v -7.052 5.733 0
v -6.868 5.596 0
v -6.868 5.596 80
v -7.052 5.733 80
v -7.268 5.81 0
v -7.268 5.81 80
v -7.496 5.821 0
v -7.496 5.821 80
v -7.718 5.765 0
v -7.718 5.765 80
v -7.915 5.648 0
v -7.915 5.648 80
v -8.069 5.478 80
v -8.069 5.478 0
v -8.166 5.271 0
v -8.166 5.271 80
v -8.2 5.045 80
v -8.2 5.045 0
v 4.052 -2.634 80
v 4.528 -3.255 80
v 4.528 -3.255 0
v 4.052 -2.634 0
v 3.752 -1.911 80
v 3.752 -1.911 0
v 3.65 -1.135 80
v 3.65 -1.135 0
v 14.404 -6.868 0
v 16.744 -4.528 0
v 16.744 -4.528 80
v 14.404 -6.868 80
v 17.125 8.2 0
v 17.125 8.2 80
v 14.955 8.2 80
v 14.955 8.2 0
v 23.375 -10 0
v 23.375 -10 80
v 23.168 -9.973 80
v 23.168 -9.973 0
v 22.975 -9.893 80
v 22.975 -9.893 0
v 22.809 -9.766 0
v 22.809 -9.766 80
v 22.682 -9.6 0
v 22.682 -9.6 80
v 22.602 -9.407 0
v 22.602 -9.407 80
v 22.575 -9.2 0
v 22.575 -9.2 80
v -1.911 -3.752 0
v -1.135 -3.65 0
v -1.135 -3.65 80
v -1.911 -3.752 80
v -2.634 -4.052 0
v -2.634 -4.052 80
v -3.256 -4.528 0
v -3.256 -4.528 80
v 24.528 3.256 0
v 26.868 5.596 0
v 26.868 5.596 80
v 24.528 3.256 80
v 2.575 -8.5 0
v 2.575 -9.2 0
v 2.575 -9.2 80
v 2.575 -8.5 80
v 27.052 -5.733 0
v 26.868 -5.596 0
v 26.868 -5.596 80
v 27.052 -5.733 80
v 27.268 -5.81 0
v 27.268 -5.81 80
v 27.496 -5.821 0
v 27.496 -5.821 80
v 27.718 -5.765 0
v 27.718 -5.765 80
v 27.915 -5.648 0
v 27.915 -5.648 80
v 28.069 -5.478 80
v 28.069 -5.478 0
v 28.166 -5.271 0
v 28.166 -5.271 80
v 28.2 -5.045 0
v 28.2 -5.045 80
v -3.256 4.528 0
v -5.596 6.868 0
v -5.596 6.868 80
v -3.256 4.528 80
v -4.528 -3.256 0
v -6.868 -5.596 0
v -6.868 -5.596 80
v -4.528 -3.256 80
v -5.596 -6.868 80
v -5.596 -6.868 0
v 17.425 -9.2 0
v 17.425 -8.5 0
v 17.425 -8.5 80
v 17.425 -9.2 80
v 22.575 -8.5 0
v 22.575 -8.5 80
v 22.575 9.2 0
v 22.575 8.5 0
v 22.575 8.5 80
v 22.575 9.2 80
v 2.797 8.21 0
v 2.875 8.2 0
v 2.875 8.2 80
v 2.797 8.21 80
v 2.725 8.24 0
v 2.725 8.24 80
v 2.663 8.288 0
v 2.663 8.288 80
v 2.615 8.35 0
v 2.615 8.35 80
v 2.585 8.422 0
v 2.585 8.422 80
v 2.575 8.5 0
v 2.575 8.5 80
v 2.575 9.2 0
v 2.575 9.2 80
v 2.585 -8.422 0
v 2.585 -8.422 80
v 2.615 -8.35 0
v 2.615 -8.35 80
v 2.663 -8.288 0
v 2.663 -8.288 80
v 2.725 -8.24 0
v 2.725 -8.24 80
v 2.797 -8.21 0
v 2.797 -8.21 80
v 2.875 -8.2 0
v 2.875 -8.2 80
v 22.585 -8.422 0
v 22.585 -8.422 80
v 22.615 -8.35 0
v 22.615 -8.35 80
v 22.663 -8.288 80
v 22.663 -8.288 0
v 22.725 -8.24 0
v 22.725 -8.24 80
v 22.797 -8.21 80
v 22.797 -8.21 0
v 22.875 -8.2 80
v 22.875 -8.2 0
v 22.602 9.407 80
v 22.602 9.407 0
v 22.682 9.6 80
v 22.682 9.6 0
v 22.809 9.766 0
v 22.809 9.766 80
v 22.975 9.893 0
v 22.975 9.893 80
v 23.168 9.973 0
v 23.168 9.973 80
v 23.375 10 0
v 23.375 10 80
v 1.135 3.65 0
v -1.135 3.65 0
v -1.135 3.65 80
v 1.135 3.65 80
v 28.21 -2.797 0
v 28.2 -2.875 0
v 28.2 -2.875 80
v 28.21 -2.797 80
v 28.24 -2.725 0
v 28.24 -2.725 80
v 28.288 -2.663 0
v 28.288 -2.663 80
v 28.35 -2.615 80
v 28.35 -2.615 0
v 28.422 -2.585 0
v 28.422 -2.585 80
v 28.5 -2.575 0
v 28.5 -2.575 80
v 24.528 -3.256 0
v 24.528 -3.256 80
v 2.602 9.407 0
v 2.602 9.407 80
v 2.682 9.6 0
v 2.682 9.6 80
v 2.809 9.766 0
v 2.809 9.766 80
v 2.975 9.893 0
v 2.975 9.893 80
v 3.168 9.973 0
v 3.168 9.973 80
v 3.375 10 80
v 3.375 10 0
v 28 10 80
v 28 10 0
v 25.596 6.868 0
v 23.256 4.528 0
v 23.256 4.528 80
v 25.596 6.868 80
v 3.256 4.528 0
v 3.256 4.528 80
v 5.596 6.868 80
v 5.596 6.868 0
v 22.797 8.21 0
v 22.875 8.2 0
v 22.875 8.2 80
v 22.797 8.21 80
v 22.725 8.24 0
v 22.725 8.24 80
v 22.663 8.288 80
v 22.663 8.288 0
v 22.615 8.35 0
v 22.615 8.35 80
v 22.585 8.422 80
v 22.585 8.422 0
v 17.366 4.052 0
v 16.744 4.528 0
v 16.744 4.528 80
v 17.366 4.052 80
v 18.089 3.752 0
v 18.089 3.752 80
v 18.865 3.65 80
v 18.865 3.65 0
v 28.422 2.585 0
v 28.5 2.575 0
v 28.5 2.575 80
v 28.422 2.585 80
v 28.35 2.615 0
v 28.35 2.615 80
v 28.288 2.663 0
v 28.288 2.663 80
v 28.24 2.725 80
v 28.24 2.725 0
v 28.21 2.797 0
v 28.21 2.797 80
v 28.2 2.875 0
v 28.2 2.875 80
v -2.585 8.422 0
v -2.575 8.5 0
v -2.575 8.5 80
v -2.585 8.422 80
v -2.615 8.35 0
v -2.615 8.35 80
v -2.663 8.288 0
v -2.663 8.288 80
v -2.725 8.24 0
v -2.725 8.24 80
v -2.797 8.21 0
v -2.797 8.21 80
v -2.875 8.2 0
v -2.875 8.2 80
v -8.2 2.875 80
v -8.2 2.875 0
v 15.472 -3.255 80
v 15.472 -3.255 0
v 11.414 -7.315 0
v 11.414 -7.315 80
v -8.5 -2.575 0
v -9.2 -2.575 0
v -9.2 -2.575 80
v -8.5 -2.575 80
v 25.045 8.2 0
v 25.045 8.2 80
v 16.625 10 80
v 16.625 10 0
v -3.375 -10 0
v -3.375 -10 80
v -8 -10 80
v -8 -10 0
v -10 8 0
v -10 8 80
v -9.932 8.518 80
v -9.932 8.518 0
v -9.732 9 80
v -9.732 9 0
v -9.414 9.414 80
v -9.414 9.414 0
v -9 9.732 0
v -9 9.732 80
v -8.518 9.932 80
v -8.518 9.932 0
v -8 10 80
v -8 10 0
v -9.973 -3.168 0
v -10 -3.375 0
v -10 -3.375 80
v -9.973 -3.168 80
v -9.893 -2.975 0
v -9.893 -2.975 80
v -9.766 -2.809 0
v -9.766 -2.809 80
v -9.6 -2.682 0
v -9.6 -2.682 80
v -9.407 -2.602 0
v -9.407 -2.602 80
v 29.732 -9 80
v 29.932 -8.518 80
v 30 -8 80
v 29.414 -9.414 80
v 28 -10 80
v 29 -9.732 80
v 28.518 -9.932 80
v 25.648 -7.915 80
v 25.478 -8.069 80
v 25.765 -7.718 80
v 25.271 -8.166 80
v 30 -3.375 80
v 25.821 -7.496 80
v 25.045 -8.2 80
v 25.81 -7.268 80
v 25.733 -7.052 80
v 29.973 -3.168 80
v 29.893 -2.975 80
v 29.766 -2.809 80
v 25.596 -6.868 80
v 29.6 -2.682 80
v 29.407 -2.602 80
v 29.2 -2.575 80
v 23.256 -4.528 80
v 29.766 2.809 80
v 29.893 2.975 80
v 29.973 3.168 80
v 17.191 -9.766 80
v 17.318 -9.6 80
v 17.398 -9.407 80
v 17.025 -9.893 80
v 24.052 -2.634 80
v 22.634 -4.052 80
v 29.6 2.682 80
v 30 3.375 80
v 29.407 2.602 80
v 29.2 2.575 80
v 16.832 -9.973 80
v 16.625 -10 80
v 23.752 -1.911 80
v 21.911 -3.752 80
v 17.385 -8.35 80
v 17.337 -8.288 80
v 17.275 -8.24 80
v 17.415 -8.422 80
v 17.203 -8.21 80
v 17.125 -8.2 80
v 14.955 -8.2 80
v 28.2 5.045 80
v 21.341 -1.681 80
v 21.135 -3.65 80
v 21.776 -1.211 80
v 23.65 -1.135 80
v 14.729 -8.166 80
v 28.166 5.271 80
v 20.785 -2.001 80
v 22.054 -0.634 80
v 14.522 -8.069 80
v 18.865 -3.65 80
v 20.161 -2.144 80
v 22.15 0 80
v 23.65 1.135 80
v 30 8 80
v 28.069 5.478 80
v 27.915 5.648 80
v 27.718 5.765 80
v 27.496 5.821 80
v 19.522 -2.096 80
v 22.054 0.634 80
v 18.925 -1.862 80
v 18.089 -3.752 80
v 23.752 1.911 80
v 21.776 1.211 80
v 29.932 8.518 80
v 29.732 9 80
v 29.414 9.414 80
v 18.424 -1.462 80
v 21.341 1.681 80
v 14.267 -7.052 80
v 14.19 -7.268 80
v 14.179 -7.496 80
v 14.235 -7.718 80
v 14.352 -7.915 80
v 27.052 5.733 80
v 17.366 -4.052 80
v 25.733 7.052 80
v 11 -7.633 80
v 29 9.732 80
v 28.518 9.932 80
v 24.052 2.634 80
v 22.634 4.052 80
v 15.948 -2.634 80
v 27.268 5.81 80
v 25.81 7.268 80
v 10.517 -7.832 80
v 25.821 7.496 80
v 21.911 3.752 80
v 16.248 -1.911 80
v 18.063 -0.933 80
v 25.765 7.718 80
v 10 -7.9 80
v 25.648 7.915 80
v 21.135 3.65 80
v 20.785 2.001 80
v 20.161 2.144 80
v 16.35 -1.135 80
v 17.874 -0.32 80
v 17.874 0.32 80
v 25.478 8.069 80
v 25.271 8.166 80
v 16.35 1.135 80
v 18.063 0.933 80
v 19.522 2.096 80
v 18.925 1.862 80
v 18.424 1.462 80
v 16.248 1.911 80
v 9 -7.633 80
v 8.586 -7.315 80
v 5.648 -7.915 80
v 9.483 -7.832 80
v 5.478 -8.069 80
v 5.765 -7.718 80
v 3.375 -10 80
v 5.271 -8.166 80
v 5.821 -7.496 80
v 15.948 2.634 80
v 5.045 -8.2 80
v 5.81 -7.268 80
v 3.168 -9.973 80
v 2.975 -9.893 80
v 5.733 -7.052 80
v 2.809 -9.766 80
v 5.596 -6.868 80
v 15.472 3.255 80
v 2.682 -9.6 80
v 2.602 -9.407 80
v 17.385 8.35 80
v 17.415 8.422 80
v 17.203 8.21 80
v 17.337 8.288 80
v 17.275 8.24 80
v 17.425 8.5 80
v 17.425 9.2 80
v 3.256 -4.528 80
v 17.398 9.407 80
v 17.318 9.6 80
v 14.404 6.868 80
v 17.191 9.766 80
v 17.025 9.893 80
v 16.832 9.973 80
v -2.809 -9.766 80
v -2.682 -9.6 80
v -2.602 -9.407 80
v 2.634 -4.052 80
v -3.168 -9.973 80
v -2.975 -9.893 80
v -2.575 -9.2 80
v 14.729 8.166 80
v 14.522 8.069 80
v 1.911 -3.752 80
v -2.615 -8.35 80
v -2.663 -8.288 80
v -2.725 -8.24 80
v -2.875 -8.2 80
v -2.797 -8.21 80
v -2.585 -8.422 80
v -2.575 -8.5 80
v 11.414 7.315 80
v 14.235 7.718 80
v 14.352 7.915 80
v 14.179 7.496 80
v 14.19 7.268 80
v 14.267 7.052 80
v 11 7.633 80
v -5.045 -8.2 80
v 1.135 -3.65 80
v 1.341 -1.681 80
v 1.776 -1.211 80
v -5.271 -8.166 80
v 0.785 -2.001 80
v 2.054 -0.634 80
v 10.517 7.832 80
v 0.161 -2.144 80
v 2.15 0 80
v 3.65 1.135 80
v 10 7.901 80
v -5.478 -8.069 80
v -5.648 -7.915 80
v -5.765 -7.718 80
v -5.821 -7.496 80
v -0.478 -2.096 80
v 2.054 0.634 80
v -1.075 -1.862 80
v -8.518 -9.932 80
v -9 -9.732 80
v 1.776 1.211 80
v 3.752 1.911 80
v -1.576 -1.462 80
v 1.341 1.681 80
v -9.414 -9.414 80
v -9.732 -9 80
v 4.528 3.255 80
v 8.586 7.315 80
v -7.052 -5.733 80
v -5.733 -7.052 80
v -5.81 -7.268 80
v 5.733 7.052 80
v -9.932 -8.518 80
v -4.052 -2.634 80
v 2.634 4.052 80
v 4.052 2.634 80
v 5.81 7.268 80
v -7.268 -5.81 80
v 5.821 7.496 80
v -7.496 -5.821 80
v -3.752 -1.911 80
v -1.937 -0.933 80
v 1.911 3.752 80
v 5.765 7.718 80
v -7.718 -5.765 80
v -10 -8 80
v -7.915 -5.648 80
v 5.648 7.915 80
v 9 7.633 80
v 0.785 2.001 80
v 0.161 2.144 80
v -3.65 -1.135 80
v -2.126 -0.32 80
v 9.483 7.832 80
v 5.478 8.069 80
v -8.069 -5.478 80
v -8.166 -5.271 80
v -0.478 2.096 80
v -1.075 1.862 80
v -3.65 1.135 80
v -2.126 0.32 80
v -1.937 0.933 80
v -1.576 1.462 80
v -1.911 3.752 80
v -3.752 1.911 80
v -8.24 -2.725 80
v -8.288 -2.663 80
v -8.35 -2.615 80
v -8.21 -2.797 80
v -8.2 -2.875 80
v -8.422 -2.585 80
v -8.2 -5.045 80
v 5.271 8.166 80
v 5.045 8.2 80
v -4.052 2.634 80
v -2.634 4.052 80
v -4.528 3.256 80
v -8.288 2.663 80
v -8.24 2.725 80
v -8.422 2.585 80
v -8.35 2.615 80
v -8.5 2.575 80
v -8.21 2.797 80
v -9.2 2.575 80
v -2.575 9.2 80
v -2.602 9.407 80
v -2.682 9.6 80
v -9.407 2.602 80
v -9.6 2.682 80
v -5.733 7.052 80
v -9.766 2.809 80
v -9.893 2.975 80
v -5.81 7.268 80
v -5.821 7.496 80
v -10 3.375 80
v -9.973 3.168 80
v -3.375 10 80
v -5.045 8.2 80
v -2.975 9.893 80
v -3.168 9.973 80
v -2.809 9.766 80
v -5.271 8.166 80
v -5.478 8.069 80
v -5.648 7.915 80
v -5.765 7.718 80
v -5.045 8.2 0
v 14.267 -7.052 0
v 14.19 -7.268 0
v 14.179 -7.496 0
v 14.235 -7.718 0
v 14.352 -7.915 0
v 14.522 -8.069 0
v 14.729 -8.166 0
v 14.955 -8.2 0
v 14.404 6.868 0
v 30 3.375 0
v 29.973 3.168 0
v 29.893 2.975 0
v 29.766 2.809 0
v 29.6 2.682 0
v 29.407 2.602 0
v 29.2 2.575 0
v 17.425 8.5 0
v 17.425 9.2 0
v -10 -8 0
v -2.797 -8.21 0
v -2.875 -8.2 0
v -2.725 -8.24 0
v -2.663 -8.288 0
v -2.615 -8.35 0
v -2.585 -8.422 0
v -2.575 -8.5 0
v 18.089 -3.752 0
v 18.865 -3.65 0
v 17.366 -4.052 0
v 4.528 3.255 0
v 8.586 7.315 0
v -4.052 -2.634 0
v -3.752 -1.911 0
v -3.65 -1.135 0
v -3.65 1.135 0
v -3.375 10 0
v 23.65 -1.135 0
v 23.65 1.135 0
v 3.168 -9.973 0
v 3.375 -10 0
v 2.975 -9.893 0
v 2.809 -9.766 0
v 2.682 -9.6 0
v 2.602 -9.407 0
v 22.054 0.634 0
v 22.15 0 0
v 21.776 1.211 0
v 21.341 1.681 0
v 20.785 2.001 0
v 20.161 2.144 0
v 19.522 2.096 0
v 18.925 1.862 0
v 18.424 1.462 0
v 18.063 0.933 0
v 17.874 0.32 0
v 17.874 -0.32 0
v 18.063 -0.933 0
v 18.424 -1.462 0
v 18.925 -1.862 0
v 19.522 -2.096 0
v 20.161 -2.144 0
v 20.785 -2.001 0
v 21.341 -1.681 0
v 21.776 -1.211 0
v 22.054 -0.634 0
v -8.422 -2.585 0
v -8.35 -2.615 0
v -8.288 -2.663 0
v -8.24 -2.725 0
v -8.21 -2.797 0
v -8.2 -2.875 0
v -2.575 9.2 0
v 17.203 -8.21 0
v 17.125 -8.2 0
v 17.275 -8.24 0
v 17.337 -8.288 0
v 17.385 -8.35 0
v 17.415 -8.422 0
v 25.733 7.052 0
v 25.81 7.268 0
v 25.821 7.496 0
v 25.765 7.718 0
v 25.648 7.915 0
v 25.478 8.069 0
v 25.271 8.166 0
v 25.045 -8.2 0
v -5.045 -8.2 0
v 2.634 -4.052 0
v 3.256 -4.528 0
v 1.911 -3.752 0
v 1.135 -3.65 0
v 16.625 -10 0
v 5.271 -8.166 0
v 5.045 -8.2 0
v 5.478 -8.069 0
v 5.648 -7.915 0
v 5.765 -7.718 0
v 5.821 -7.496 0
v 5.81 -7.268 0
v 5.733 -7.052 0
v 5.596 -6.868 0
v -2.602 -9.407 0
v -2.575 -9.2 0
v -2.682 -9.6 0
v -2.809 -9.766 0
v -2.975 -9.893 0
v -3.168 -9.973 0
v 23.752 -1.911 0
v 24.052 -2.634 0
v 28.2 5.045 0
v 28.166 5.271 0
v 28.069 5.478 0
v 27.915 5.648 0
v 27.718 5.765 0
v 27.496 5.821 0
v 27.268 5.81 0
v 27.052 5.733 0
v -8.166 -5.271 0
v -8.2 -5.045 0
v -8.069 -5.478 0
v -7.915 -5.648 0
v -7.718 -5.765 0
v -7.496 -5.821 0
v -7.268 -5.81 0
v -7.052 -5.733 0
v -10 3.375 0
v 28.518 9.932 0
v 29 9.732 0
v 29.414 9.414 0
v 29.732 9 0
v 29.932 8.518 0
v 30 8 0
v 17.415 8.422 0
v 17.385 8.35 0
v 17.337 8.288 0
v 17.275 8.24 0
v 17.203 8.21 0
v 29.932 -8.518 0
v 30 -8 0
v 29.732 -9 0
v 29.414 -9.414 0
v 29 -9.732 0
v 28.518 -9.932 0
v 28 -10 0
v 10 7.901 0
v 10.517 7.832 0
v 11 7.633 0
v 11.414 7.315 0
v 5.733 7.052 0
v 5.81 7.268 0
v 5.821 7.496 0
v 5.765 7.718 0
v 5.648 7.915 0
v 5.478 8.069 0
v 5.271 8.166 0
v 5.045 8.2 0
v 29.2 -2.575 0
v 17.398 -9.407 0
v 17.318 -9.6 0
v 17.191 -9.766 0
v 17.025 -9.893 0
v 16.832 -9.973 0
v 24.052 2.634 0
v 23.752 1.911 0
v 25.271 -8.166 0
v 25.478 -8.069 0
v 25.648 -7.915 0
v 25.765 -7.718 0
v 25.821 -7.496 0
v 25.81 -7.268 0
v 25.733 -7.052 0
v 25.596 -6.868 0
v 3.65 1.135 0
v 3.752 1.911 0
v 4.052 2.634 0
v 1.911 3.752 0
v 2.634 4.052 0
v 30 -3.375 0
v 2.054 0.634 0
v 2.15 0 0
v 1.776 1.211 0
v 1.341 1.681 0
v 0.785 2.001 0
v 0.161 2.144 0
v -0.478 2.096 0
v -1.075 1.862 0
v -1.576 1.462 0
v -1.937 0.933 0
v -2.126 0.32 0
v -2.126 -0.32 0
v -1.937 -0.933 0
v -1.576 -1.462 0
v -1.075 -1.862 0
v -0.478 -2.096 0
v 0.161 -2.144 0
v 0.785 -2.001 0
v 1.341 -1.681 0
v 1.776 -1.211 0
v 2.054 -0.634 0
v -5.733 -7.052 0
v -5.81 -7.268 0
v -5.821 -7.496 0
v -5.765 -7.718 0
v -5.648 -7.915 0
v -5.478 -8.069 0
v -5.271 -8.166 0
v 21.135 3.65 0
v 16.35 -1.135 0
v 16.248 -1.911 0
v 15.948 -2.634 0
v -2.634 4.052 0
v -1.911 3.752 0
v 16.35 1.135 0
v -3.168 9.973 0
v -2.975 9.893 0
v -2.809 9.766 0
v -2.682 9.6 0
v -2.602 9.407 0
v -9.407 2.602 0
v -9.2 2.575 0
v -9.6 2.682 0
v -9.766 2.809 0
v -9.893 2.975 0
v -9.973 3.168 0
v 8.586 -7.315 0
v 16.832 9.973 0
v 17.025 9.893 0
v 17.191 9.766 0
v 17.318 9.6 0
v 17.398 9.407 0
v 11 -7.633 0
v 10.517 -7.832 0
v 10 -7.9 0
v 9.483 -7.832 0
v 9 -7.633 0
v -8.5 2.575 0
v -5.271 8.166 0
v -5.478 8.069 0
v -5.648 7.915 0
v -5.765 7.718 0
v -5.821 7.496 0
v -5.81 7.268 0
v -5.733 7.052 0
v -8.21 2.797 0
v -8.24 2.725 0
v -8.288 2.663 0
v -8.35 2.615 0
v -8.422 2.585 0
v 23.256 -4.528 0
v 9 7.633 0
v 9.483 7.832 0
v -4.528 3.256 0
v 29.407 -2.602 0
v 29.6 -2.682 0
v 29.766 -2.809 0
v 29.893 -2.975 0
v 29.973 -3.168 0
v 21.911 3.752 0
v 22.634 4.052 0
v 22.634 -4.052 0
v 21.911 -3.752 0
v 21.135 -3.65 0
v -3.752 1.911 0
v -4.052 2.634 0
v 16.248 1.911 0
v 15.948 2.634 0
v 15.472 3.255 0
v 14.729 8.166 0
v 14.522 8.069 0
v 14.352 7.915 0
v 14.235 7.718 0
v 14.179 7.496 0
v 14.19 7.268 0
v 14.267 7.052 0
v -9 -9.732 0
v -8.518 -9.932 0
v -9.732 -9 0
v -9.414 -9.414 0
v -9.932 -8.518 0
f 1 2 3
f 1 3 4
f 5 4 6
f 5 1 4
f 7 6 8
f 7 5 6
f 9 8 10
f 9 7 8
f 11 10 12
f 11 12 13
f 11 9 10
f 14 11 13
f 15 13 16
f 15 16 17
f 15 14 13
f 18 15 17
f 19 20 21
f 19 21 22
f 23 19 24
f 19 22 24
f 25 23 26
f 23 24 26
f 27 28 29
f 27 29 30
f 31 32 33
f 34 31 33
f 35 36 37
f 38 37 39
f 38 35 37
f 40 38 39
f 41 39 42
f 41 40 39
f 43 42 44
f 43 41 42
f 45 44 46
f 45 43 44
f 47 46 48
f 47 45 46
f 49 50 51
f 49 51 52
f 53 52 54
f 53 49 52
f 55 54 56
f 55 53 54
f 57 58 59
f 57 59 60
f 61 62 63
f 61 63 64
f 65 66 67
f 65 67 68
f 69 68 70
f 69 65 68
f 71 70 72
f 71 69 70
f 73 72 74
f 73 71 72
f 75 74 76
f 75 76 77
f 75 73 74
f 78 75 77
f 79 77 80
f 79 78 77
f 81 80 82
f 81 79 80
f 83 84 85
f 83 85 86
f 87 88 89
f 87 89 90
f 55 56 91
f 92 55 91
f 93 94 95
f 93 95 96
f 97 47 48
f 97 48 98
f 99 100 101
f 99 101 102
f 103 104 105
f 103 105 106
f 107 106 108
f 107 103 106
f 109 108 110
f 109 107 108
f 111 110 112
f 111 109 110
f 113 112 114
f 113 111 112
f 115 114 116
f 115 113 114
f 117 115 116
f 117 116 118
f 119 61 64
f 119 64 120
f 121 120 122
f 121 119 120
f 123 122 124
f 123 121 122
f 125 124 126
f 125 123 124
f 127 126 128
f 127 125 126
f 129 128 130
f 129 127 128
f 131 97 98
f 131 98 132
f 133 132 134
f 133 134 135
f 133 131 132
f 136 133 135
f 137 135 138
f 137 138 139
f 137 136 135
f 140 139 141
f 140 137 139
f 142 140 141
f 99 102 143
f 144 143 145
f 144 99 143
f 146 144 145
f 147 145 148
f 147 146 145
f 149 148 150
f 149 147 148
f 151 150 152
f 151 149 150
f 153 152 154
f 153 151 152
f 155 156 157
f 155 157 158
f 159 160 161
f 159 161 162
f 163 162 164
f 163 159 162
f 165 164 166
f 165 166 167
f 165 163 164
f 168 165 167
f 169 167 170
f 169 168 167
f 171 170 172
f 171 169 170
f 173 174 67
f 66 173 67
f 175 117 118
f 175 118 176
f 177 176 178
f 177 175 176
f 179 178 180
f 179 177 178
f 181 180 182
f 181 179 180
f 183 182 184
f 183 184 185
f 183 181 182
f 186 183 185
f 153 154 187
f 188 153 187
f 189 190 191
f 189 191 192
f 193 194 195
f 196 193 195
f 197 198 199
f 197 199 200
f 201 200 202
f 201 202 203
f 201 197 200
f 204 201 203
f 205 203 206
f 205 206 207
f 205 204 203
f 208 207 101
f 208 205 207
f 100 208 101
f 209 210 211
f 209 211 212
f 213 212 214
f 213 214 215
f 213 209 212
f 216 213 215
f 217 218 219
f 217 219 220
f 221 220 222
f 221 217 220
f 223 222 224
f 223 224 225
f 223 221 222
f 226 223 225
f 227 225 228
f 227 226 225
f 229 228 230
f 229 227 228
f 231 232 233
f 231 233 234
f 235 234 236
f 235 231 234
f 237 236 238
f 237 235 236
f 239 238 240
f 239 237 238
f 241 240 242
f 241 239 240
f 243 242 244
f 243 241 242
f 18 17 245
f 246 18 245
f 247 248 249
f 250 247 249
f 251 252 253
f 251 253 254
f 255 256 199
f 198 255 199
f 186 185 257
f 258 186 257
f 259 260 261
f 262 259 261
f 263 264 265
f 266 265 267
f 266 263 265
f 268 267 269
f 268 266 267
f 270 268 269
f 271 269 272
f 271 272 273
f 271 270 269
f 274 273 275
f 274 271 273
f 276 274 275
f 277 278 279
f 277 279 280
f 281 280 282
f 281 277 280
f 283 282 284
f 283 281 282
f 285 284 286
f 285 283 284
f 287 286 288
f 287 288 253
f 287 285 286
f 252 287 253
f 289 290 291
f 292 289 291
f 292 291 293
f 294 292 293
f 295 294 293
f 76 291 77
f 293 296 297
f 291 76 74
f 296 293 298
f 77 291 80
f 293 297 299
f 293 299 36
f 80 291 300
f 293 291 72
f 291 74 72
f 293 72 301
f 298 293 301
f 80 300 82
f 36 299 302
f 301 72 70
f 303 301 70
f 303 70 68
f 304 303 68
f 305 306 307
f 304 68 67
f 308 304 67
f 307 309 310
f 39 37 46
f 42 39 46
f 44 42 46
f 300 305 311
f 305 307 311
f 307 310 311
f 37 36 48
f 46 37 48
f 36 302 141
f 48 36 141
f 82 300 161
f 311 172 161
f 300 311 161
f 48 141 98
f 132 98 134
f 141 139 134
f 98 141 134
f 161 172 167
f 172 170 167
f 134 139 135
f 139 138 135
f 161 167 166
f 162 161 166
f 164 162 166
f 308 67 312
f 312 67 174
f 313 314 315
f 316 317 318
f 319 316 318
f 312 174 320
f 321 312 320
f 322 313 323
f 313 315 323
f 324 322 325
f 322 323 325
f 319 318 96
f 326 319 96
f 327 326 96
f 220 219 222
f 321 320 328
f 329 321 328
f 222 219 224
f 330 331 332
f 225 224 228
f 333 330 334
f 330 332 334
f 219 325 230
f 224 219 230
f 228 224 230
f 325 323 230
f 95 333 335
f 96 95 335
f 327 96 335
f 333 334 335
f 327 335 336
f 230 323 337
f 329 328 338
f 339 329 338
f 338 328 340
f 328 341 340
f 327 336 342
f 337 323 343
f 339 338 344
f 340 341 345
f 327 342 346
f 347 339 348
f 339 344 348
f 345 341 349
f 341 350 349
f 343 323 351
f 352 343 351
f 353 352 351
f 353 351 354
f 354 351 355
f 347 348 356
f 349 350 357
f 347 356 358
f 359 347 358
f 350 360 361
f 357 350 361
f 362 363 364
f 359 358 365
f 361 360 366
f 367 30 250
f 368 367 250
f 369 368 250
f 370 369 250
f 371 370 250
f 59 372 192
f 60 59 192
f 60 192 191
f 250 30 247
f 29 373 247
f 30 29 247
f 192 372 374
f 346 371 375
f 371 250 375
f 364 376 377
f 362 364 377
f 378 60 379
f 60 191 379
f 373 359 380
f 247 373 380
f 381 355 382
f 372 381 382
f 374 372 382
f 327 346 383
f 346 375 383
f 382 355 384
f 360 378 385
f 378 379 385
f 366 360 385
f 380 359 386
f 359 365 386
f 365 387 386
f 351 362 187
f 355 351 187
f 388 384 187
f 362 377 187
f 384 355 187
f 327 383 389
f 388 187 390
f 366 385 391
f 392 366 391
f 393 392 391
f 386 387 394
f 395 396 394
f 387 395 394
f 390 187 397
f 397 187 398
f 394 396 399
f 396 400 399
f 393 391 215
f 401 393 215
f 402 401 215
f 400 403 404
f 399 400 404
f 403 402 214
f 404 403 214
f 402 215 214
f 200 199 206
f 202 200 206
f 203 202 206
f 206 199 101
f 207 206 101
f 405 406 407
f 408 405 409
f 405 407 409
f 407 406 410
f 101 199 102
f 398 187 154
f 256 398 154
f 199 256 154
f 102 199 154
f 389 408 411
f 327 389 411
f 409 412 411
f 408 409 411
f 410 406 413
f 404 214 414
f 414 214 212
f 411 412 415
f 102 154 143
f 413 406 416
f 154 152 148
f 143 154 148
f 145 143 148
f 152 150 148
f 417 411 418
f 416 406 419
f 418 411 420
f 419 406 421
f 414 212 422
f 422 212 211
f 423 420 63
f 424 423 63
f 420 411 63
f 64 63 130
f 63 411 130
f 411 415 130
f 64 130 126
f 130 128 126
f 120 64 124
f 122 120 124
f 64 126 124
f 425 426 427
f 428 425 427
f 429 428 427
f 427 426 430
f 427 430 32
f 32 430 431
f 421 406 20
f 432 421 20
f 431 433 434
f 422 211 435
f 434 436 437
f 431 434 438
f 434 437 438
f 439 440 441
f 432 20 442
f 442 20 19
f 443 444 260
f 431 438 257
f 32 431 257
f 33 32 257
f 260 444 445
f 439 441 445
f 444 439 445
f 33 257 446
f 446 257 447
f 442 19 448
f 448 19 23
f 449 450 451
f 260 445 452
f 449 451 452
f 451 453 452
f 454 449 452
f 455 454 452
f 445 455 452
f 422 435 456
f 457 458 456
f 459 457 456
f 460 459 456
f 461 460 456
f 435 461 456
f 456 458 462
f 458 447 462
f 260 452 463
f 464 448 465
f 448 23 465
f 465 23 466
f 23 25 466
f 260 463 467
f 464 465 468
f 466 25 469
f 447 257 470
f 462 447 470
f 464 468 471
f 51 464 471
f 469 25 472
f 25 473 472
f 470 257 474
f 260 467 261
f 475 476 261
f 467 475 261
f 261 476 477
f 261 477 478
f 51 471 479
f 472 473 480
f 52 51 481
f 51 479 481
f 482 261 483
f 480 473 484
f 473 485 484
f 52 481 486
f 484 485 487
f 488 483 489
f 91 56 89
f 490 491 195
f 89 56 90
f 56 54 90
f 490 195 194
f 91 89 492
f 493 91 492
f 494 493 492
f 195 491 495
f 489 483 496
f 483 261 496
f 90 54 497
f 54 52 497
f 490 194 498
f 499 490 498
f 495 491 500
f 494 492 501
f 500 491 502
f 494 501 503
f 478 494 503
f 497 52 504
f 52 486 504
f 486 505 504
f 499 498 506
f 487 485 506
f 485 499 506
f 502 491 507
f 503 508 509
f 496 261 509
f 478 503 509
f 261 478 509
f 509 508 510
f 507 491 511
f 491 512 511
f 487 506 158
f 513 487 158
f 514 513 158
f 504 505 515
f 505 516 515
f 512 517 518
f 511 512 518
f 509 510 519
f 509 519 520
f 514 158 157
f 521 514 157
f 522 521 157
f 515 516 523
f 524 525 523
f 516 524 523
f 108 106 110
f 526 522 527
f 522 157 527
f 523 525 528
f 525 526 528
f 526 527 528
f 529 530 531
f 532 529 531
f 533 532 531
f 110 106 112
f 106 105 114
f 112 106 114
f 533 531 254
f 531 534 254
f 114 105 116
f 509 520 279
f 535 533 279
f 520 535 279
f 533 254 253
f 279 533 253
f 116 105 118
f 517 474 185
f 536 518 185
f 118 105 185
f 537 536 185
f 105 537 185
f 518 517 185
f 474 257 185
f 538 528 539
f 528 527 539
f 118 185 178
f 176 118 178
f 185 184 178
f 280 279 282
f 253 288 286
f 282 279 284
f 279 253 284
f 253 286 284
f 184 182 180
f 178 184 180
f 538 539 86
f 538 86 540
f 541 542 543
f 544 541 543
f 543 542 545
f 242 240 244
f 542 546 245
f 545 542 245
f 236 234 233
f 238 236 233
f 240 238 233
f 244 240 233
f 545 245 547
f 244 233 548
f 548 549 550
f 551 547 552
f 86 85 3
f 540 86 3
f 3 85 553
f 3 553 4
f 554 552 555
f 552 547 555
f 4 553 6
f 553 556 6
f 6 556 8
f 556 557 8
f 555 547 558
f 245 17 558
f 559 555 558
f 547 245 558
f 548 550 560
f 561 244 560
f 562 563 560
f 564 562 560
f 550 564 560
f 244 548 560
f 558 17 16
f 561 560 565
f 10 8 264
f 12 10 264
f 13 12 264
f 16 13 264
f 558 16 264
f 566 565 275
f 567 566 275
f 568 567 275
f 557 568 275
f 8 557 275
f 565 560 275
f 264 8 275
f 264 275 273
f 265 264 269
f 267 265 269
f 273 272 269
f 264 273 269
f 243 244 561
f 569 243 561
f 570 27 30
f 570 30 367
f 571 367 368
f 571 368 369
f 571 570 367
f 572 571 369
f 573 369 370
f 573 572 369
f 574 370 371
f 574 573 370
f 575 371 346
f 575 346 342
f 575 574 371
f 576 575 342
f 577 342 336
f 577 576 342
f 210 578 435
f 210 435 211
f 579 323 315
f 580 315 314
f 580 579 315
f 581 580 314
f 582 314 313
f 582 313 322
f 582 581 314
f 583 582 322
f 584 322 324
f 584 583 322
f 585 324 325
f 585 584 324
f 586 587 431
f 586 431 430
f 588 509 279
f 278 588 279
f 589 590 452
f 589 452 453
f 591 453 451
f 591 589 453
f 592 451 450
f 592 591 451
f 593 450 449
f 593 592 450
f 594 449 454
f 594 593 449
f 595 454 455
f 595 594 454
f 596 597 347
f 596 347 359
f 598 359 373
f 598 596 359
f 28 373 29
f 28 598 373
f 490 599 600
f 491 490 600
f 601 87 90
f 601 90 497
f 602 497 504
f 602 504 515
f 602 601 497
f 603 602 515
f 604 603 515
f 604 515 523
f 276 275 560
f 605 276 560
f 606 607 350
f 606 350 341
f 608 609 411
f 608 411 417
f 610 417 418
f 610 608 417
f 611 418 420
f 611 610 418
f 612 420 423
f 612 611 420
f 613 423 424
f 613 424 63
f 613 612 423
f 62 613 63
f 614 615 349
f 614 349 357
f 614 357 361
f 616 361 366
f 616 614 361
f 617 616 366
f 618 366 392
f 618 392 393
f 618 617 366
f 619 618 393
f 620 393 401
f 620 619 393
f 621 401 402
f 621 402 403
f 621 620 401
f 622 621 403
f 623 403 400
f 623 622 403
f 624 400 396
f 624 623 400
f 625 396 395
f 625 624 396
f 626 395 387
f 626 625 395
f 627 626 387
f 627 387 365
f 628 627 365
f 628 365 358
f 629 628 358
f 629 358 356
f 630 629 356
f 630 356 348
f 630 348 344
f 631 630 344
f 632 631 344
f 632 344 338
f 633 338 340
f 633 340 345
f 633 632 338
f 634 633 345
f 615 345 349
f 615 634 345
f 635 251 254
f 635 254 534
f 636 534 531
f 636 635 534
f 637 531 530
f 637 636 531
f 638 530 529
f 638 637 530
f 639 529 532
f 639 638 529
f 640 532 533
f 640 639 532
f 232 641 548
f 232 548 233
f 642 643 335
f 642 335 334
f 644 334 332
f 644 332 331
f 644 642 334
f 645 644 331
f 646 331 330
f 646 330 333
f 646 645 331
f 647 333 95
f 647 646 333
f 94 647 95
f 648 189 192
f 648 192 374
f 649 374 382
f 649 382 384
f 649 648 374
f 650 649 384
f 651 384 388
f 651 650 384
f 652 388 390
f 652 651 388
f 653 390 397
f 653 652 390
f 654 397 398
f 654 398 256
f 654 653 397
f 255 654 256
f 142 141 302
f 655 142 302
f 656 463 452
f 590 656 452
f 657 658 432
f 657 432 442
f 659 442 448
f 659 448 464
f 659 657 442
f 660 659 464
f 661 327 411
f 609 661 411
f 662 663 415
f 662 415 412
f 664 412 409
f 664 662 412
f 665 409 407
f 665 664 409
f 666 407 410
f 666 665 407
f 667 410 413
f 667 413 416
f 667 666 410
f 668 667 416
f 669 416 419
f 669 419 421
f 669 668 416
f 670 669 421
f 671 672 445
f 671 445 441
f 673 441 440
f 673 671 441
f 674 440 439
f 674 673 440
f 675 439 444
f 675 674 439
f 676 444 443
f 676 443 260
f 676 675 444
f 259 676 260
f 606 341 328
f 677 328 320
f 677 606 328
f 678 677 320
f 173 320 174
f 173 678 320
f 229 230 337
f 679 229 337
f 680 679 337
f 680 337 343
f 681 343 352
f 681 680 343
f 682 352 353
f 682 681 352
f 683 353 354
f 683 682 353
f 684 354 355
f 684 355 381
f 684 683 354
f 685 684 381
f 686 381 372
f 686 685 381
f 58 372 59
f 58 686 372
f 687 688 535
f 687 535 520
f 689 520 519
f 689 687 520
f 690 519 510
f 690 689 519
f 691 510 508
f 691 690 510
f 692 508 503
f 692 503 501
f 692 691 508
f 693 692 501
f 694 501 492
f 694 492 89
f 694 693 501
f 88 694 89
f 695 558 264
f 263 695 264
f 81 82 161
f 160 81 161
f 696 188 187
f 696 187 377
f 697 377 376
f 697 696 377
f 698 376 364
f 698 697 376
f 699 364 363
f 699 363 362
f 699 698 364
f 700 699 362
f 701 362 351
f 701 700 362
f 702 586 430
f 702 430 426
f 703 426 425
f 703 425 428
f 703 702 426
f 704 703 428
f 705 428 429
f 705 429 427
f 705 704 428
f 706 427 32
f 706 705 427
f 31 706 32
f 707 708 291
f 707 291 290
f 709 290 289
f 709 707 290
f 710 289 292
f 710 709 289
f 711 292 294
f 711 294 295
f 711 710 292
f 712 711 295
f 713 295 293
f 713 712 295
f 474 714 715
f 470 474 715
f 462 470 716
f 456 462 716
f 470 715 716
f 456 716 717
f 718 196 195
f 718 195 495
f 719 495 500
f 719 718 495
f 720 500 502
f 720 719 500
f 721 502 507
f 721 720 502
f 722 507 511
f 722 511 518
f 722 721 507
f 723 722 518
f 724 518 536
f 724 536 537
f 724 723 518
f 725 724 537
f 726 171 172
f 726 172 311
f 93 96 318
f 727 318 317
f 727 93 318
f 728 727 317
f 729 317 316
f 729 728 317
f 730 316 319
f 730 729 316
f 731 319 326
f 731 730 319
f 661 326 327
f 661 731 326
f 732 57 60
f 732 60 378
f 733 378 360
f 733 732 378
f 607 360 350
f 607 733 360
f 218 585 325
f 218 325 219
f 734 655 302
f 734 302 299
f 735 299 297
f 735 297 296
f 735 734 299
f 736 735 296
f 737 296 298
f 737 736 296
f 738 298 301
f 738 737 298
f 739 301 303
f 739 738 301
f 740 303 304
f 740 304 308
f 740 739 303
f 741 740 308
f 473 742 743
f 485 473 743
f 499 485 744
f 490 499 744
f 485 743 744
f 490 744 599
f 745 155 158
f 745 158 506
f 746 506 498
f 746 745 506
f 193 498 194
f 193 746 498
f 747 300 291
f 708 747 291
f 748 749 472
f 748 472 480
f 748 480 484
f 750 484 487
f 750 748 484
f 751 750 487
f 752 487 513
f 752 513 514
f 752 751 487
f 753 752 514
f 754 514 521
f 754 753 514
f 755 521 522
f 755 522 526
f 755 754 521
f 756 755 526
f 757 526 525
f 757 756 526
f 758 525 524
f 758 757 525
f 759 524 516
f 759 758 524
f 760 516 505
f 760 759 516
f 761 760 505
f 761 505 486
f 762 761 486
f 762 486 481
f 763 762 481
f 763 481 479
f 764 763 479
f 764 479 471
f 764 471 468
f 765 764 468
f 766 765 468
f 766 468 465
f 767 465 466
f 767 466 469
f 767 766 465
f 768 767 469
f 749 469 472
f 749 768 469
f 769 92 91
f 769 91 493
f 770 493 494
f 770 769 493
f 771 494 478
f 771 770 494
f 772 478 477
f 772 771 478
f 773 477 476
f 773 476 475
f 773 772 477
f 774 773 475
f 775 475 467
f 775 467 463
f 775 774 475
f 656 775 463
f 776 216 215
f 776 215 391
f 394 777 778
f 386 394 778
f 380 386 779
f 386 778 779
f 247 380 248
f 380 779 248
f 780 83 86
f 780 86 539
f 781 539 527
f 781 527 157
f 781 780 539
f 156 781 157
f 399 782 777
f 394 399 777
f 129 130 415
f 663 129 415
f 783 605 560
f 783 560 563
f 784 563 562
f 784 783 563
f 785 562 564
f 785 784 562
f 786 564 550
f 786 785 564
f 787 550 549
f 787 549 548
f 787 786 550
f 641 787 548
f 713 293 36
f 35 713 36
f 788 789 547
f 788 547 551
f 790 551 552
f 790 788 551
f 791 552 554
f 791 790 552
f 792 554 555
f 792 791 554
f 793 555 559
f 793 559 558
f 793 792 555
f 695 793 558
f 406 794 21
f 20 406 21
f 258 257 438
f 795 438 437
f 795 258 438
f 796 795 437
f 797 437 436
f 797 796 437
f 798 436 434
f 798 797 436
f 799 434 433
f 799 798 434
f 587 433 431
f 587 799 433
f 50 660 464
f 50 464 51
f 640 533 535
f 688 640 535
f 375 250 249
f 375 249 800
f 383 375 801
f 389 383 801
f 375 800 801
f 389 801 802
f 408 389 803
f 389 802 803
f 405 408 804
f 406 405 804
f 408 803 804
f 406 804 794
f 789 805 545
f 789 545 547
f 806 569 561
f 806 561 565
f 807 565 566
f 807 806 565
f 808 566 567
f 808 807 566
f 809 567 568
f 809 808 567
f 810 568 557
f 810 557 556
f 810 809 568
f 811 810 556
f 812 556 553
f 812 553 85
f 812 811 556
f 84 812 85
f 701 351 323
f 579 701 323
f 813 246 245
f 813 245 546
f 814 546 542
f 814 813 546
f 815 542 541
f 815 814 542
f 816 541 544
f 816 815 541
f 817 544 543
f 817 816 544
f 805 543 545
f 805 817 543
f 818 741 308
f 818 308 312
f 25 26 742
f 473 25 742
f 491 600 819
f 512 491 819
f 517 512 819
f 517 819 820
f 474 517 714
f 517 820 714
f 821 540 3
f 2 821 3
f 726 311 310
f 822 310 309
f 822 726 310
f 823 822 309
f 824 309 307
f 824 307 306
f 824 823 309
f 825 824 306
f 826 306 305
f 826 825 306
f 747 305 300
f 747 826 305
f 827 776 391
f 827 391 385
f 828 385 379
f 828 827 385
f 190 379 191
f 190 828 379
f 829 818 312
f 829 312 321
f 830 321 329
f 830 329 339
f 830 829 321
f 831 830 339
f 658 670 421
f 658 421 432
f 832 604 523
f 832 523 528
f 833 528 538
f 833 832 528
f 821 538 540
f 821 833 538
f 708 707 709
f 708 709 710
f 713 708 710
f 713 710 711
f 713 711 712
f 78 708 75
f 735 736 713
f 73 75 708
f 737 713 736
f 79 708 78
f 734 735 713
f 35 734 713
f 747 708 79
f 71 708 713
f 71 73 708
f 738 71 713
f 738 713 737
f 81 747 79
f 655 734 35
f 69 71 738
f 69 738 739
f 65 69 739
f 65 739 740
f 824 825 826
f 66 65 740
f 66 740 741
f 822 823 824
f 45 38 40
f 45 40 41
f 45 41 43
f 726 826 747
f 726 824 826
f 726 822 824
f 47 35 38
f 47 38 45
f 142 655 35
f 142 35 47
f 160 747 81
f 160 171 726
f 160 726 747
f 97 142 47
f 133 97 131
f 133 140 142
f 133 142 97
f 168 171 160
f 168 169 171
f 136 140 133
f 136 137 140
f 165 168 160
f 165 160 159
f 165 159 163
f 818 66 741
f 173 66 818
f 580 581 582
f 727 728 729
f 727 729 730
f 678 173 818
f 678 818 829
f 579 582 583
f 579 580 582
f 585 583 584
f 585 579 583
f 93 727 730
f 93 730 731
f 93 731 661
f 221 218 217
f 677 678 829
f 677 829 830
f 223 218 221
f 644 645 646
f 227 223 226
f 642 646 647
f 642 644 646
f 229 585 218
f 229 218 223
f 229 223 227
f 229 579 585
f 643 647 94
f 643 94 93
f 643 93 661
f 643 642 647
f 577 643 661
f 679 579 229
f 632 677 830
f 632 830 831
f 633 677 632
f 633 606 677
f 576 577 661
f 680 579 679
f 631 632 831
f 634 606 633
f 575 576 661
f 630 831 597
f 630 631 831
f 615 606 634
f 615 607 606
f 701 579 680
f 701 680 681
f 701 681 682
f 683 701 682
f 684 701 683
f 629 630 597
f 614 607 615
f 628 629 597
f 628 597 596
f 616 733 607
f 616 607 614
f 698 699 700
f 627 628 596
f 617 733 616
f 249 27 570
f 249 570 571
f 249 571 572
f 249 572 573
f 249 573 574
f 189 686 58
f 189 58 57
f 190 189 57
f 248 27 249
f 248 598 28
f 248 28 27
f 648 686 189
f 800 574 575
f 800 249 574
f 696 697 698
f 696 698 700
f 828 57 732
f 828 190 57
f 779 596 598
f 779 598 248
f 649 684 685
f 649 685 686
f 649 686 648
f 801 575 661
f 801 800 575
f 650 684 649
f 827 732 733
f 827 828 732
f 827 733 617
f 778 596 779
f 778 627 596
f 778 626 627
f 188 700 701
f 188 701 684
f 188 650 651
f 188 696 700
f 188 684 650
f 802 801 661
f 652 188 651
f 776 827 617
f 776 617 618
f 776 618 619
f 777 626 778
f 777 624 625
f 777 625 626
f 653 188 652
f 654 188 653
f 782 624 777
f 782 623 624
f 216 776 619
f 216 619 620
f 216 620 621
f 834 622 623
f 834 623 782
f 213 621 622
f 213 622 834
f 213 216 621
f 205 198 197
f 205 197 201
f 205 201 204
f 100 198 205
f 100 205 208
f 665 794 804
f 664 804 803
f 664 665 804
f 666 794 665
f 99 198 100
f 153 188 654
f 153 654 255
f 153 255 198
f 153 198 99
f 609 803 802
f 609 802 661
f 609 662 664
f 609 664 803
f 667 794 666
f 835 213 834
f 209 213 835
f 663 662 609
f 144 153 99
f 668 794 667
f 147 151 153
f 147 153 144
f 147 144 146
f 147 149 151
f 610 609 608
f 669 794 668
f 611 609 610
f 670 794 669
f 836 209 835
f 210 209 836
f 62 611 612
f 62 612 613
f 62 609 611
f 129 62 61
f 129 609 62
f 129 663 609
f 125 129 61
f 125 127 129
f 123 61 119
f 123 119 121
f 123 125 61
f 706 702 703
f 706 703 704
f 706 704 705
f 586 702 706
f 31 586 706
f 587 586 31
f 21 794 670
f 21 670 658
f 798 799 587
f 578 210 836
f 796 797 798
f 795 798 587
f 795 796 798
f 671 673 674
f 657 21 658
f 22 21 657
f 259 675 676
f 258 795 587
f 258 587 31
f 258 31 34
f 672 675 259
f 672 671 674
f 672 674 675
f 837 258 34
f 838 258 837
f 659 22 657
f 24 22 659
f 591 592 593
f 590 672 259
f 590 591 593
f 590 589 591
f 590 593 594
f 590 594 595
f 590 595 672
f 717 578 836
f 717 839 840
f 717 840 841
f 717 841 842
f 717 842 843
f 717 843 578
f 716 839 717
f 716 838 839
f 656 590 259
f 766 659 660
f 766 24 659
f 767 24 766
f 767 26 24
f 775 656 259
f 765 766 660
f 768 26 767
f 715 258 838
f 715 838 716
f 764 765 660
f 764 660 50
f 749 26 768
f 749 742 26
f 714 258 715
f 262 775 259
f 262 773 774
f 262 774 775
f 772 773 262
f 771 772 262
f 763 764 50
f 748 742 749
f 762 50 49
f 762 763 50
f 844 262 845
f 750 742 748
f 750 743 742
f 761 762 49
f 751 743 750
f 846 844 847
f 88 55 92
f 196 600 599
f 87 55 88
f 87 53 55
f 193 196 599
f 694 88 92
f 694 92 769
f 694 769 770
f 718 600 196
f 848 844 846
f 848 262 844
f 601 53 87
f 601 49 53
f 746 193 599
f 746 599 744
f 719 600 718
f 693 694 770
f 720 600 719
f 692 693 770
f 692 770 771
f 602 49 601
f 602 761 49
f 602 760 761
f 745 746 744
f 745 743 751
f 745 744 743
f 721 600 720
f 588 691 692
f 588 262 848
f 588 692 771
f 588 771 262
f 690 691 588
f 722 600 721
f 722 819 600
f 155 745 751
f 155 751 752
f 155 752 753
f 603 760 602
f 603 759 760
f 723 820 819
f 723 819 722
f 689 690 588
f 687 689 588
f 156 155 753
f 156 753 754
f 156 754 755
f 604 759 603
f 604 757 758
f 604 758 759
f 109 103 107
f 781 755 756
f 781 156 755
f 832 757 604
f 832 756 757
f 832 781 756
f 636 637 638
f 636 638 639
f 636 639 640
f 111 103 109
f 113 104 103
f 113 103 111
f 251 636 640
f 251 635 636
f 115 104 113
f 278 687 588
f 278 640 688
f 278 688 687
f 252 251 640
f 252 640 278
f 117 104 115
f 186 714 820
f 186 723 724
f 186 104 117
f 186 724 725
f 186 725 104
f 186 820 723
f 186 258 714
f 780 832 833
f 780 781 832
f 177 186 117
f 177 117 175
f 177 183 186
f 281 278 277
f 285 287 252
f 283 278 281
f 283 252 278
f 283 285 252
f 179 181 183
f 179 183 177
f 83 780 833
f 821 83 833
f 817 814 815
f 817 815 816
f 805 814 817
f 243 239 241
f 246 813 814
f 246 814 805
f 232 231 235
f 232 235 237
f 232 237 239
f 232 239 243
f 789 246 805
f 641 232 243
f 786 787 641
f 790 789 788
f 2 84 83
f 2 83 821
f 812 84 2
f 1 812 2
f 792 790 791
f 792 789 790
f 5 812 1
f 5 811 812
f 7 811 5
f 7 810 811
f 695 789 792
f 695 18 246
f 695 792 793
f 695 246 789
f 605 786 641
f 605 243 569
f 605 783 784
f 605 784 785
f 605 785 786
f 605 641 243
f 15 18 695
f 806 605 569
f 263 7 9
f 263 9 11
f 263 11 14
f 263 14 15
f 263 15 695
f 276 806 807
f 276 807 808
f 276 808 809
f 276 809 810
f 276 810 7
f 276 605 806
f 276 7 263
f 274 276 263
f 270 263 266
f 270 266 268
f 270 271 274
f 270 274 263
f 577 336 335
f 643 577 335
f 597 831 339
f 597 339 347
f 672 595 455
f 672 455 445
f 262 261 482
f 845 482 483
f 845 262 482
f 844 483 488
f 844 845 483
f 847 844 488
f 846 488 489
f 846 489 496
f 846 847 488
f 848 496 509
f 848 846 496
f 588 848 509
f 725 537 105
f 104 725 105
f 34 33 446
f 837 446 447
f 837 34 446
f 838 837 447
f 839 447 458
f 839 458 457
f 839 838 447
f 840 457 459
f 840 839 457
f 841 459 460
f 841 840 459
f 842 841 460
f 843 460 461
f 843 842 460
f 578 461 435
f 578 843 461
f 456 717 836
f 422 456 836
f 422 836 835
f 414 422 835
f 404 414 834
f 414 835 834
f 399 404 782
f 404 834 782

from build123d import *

# Parameters (mm, degrees)
CROQUIS3_R              = 2.15
SALIENTE_EXTRUIR1_DEPTH = 80


with BuildPart() as part:
    # Croquis3 → Saliente-Extruir1 (new body)
    with BuildSketch(Plane.XY):
        with BuildLine():
            Line((-2.574814133, 9.2), (-2.574814133, 8.5))
            ThreePointArc((-2.574814133, 8.5), (-2.662682099, 8.287867966), (-2.874814133, 8.2))
            Line((-2.874814133, 8.2), (-5.044814133, 8.2))
            ThreePointArc((-5.044814133, 8.2), (-5.765448465, 7.718473047), (-5.596326761, 6.868426051))
            Line((-5.596326761, 6.868426051), (-3.255673209, 4.528032719))
            ThreePointArc((-3.255673209, 4.528032719), (-2.282627587, 3.878186348), (-1.135, 3.65))
            Line((-1.135, 3.65), (1.135, 3.65))
            ThreePointArc((1.135, 3.65), (2.282627587, 3.878186348), (3.255673209, 4.528032719))
            Line((3.255673209, 4.528032719), (5.596326761, 6.868426051))
            ThreePointArc((5.596326761, 6.868426051), (5.765448465, 7.718473047), (5.044814133, 8.2))
            Line((5.044814133, 8.2), (2.874814133, 8.2))
            ThreePointArc((2.874814133, 8.2), (2.662682099, 8.287867966), (2.574814133, 8.5))
            Line((2.574814133, 8.5), (2.574814133, 9.2))
            ThreePointArc((2.574814133, 9.2), (2.809128708, 9.765685425), (3.374814133, 10))
            Line((3.374814133, 10), (16.625185867, 10))
            ThreePointArc((16.625185867, 10), (17.190871292, 9.765685425), (17.425185867, 9.2))
            Line((17.425185867, 9.2), (17.425185867, 8.5))
            ThreePointArc((17.425185867, 8.5), (17.337317901, 8.287867966), (17.125185867, 8.2))
            Line((17.125185867, 8.2), (14.955185867, 8.2))
            ThreePointArc((14.955185867, 8.2), (14.234551535, 7.718473047), (14.403673239, 6.868426051))
            Line((14.403673239, 6.868426051), (16.744326791, 4.528032719))
            ThreePointArc((16.744326791, 4.528032719), (17.717372413, 3.878186348), (18.865, 3.65))
            Line((18.865, 3.65), (21.135, 3.65))
            ThreePointArc((21.135, 3.65), (22.282627587, 3.878186348), (23.255673209, 4.528032719))
            Line((23.255673209, 4.528032719), (25.596326761, 6.868426051))
            ThreePointArc((25.596326761, 6.868426051), (25.765448465, 7.718473047), (25.044814133, 8.2))
            Line((25.044814133, 8.2), (22.874814133, 8.2))
            ThreePointArc((22.874814133, 8.2), (22.662682099, 8.287867966), (22.574814133, 8.5))
            Line((22.574814133, 8.5), (22.574814133, 9.2))
            ThreePointArc((22.574814133, 9.2), (22.809128708, 9.765685425), (23.374814133, 10))
            Line((23.374814133, 10), (28, 10))
            ThreePointArc((28, 10), (29.414213562, 9.414213562), (30, 8))
            Line((30, 8), (30, 3.374814133))
            ThreePointArc((30, 3.374814133), (29.765685425, 2.809128708), (29.2, 2.574814133))
            Line((29.2, 2.574814133), (28.5, 2.574814133))
            ThreePointArc((28.5, 2.574814133), (28.287867966, 2.662682099), (28.2, 2.874814133))
            Line((28.2, 2.874814133), (28.2, 5.044814133))
            ThreePointArc((28.2, 5.044814133), (27.718473047, 5.765448465), (26.868426051, 5.596326761))
            Line((26.868426051, 5.596326761), (24.528032719, 3.255673209))
            ThreePointArc((24.528032719, 3.255673209), (23.878186348, 2.282627587), (23.65, 1.135))
            Line((23.65, 1.135), (23.65, -1.135))
            ThreePointArc((23.65, -1.135), (23.878186348, -2.282627587), (24.528032719, -3.255673209))
            Line((24.528032719, -3.255673209), (26.868426051, -5.596326761))
            ThreePointArc((26.868426051, -5.596326761), (27.718473047, -5.765448465), (28.2, -5.044814133))
            Line((28.2, -5.044814133), (28.2, -2.874814133))
            ThreePointArc((28.2, -2.874814133), (28.287867966, -2.662682099), (28.5, -2.574814133))
            Line((28.5, -2.574814133), (29.2, -2.574814133))
            ThreePointArc((29.2, -2.574814133), (29.765685425, -2.809128708), (30, -3.374814133))
            Line((30, -3.374814133), (30, -8))
            ThreePointArc((30, -8), (29.414213562, -9.414213562), (28, -10))
            Line((28, -10), (23.374814133, -10))
            ThreePointArc((23.374814133, -10), (22.809128708, -9.765685425), (22.574814133, -9.2))
            Line((22.574814133, -9.2), (22.574814133, -8.5))
            ThreePointArc((22.574814133, -8.5), (22.662682099, -8.287867966), (22.874814133, -8.2))
            Line((22.874814133, -8.2), (25.044814133, -8.2))
            ThreePointArc((25.044814133, -8.2), (25.765448465, -7.718473047), (25.596326761, -6.868426051))
            Line((25.596326761, -6.868426051), (23.255673209, -4.528032719))
            ThreePointArc((23.255673209, -4.528032719), (22.282627587, -3.878186348), (21.135, -3.65))
            Line((21.135, -3.65), (18.865, -3.65))
            ThreePointArc((18.865, -3.65), (17.717372413, -3.878186348), (16.744326791, -4.528032719))
            Line((16.744326791, -4.528032719), (14.403673239, -6.868426051))
            ThreePointArc((14.403673239, -6.868426051), (14.234551535, -7.718473047), (14.955185867, -8.2))
            Line((14.955185867, -8.2), (17.125185867, -8.2))
            ThreePointArc((17.125185867, -8.2), (17.337317901, -8.287867966), (17.425185867, -8.5))
            Line((17.425185867, -8.5), (17.425185867, -9.2))
            ThreePointArc((17.425185867, -9.2), (17.190871292, -9.765685425), (16.625185867, -10))
            Line((16.625185867, -10), (3.374814133, -10))
            ThreePointArc((3.374814133, -10), (2.809128708, -9.765685425), (2.574814133, -9.2))
            Line((2.574814133, -9.2), (2.574814133, -8.5))
            ThreePointArc((2.574814133, -8.5), (2.662682099, -8.287867966), (2.874814133, -8.2))
            Line((2.874814133, -8.2), (5.044814133, -8.2))
            ThreePointArc((5.044814133, -8.2), (5.765448465, -7.718473047), (5.596326761, -6.868426051))
            Line((5.596326761, -6.868426051), (3.255673209, -4.528032719))
            ThreePointArc((3.255673209, -4.528032719), (2.282627587, -3.878186348), (1.135, -3.65))
            Line((1.135, -3.65), (-1.135, -3.65))
            ThreePointArc((-1.135, -3.65), (-2.282627587, -3.878186348), (-3.255673209, -4.528032719))
            Line((-3.255673209, -4.528032719), (-5.596326761, -6.868426051))
            ThreePointArc((-5.596326761, -6.868426051), (-5.765448465, -7.718473047), (-5.044814133, -8.2))
            Line((-5.044814133, -8.2), (-2.874814133, -8.2))
            ThreePointArc((-2.874814133, -8.2), (-2.662682099, -8.287867966), (-2.574814133, -8.5))
            Line((-2.574814133, -8.5), (-2.574814133, -9.2))
            ThreePointArc((-2.574814133, -9.2), (-2.809128708, -9.765685425), (-3.374814133, -10))
            Line((-3.374814133, -10), (-8, -10))
            ThreePointArc((-8, -10), (-9.414213562, -9.414213562), (-10, -8))
            Line((-10, -8), (-10, -3.374814133))
            ThreePointArc((-10, -3.374814133), (-9.765685425, -2.809128708), (-9.2, -2.574814133))
            Line((-9.2, -2.574814133), (-8.5, -2.574814133))
            ThreePointArc((-8.5, -2.574814133), (-8.287867966, -2.662682099), (-8.2, -2.874814133))
            Line((-8.2, -2.874814133), (-8.2, -5.044814133))
            ThreePointArc((-8.2, -5.044814133), (-7.718473047, -5.765448465), (-6.868426051, -5.596326761))
            Line((-6.868426051, -5.596326761), (-4.528032719, -3.255673209))
            ThreePointArc((-4.528032719, -3.255673209), (-3.878186348, -2.282627587), (-3.65, -1.135))
            Line((-3.65, -1.135), (-3.65, 1.135))
            ThreePointArc((-3.65, 1.135), (-3.878186348, 2.282627587), (-4.528032719, 3.255673209))
            Line((-4.528032719, 3.255673209), (-6.868426051, 5.596326761))
            ThreePointArc((-6.868426051, 5.596326761), (-7.718473047, 5.765448465), (-8.2, 5.044814133))
            Line((-8.2, 5.044814133), (-8.2, 2.874814133))
            ThreePointArc((-8.2, 2.874814133), (-8.287867966, 2.662682099), (-8.5, 2.574814133))
            Line((-8.5, 2.574814133), (-9.2, 2.574814133))
            ThreePointArc((-9.2, 2.574814133), (-9.765685425, 2.809128708), (-10, 3.374814133))
            Line((-10, 3.374814133), (-10, 8))
            ThreePointArc((-10, 8), (-9.414213562, 9.414213562), (-8, 10))
            Line((-8, 10), (-3.374814133, 10))
            ThreePointArc((-3.374814133, 10), (-2.809128708, 9.765685425), (-2.574814133, 9.2))
        make_face()
        Circle(CROQUIS3_R, mode=Mode.SUBTRACT)
        with Locations((20, 0)):
            Circle(CROQUIS3_R, mode=Mode.SUBTRACT)
        with BuildLine():
            Line((4.528394658, 3.25516976), (8.586400769, 7.314749345))
            ThreePointArc((8.586400769, 7.314749345), (9.234932122, 7.748324734), (10, 7.900809736))
            ThreePointArc((10, 7.900809736), (10.765067878, 7.748324734), (11.413599231, 7.314749345))
            Line((11.413599231, 7.314749345), (15.471605342, 3.25516976))
            ThreePointArc((15.471605342, 3.25516976), (16.121559892, 2.282196395), (16.349873833, 1.134594184))
            Line((16.349873833, 1.134594184), (16.349873833, -1.134594184))
            ThreePointArc((16.349873833, -1.134594184), (16.121559892, -2.282196395), (15.471605342, -3.25516976))
            Line((15.471605342, -3.25516976), (11.413599231, -7.314749345))
            ThreePointArc((11.413599231, -7.314749345), (10, -7.900441833), (8.586400769, -7.314749345))
            Line((8.586400769, -7.314749345), (4.528394658, -3.25516976))
            ThreePointArc((4.528394658, -3.25516976), (3.878440108, -2.282196395), (3.650126167, -1.134594184))
            Line((3.650126167, -1.134594184), (3.650126167, 1.134594184))
            ThreePointArc((3.650126167, 1.134594184), (3.878440108, 2.282196395), (4.528394658, 3.25516976))
        make_face(mode=Mode.SUBTRACT)
    extrude(amount=SALIENTE_EXTRUIR1_DEPTH)


solid = part.part
